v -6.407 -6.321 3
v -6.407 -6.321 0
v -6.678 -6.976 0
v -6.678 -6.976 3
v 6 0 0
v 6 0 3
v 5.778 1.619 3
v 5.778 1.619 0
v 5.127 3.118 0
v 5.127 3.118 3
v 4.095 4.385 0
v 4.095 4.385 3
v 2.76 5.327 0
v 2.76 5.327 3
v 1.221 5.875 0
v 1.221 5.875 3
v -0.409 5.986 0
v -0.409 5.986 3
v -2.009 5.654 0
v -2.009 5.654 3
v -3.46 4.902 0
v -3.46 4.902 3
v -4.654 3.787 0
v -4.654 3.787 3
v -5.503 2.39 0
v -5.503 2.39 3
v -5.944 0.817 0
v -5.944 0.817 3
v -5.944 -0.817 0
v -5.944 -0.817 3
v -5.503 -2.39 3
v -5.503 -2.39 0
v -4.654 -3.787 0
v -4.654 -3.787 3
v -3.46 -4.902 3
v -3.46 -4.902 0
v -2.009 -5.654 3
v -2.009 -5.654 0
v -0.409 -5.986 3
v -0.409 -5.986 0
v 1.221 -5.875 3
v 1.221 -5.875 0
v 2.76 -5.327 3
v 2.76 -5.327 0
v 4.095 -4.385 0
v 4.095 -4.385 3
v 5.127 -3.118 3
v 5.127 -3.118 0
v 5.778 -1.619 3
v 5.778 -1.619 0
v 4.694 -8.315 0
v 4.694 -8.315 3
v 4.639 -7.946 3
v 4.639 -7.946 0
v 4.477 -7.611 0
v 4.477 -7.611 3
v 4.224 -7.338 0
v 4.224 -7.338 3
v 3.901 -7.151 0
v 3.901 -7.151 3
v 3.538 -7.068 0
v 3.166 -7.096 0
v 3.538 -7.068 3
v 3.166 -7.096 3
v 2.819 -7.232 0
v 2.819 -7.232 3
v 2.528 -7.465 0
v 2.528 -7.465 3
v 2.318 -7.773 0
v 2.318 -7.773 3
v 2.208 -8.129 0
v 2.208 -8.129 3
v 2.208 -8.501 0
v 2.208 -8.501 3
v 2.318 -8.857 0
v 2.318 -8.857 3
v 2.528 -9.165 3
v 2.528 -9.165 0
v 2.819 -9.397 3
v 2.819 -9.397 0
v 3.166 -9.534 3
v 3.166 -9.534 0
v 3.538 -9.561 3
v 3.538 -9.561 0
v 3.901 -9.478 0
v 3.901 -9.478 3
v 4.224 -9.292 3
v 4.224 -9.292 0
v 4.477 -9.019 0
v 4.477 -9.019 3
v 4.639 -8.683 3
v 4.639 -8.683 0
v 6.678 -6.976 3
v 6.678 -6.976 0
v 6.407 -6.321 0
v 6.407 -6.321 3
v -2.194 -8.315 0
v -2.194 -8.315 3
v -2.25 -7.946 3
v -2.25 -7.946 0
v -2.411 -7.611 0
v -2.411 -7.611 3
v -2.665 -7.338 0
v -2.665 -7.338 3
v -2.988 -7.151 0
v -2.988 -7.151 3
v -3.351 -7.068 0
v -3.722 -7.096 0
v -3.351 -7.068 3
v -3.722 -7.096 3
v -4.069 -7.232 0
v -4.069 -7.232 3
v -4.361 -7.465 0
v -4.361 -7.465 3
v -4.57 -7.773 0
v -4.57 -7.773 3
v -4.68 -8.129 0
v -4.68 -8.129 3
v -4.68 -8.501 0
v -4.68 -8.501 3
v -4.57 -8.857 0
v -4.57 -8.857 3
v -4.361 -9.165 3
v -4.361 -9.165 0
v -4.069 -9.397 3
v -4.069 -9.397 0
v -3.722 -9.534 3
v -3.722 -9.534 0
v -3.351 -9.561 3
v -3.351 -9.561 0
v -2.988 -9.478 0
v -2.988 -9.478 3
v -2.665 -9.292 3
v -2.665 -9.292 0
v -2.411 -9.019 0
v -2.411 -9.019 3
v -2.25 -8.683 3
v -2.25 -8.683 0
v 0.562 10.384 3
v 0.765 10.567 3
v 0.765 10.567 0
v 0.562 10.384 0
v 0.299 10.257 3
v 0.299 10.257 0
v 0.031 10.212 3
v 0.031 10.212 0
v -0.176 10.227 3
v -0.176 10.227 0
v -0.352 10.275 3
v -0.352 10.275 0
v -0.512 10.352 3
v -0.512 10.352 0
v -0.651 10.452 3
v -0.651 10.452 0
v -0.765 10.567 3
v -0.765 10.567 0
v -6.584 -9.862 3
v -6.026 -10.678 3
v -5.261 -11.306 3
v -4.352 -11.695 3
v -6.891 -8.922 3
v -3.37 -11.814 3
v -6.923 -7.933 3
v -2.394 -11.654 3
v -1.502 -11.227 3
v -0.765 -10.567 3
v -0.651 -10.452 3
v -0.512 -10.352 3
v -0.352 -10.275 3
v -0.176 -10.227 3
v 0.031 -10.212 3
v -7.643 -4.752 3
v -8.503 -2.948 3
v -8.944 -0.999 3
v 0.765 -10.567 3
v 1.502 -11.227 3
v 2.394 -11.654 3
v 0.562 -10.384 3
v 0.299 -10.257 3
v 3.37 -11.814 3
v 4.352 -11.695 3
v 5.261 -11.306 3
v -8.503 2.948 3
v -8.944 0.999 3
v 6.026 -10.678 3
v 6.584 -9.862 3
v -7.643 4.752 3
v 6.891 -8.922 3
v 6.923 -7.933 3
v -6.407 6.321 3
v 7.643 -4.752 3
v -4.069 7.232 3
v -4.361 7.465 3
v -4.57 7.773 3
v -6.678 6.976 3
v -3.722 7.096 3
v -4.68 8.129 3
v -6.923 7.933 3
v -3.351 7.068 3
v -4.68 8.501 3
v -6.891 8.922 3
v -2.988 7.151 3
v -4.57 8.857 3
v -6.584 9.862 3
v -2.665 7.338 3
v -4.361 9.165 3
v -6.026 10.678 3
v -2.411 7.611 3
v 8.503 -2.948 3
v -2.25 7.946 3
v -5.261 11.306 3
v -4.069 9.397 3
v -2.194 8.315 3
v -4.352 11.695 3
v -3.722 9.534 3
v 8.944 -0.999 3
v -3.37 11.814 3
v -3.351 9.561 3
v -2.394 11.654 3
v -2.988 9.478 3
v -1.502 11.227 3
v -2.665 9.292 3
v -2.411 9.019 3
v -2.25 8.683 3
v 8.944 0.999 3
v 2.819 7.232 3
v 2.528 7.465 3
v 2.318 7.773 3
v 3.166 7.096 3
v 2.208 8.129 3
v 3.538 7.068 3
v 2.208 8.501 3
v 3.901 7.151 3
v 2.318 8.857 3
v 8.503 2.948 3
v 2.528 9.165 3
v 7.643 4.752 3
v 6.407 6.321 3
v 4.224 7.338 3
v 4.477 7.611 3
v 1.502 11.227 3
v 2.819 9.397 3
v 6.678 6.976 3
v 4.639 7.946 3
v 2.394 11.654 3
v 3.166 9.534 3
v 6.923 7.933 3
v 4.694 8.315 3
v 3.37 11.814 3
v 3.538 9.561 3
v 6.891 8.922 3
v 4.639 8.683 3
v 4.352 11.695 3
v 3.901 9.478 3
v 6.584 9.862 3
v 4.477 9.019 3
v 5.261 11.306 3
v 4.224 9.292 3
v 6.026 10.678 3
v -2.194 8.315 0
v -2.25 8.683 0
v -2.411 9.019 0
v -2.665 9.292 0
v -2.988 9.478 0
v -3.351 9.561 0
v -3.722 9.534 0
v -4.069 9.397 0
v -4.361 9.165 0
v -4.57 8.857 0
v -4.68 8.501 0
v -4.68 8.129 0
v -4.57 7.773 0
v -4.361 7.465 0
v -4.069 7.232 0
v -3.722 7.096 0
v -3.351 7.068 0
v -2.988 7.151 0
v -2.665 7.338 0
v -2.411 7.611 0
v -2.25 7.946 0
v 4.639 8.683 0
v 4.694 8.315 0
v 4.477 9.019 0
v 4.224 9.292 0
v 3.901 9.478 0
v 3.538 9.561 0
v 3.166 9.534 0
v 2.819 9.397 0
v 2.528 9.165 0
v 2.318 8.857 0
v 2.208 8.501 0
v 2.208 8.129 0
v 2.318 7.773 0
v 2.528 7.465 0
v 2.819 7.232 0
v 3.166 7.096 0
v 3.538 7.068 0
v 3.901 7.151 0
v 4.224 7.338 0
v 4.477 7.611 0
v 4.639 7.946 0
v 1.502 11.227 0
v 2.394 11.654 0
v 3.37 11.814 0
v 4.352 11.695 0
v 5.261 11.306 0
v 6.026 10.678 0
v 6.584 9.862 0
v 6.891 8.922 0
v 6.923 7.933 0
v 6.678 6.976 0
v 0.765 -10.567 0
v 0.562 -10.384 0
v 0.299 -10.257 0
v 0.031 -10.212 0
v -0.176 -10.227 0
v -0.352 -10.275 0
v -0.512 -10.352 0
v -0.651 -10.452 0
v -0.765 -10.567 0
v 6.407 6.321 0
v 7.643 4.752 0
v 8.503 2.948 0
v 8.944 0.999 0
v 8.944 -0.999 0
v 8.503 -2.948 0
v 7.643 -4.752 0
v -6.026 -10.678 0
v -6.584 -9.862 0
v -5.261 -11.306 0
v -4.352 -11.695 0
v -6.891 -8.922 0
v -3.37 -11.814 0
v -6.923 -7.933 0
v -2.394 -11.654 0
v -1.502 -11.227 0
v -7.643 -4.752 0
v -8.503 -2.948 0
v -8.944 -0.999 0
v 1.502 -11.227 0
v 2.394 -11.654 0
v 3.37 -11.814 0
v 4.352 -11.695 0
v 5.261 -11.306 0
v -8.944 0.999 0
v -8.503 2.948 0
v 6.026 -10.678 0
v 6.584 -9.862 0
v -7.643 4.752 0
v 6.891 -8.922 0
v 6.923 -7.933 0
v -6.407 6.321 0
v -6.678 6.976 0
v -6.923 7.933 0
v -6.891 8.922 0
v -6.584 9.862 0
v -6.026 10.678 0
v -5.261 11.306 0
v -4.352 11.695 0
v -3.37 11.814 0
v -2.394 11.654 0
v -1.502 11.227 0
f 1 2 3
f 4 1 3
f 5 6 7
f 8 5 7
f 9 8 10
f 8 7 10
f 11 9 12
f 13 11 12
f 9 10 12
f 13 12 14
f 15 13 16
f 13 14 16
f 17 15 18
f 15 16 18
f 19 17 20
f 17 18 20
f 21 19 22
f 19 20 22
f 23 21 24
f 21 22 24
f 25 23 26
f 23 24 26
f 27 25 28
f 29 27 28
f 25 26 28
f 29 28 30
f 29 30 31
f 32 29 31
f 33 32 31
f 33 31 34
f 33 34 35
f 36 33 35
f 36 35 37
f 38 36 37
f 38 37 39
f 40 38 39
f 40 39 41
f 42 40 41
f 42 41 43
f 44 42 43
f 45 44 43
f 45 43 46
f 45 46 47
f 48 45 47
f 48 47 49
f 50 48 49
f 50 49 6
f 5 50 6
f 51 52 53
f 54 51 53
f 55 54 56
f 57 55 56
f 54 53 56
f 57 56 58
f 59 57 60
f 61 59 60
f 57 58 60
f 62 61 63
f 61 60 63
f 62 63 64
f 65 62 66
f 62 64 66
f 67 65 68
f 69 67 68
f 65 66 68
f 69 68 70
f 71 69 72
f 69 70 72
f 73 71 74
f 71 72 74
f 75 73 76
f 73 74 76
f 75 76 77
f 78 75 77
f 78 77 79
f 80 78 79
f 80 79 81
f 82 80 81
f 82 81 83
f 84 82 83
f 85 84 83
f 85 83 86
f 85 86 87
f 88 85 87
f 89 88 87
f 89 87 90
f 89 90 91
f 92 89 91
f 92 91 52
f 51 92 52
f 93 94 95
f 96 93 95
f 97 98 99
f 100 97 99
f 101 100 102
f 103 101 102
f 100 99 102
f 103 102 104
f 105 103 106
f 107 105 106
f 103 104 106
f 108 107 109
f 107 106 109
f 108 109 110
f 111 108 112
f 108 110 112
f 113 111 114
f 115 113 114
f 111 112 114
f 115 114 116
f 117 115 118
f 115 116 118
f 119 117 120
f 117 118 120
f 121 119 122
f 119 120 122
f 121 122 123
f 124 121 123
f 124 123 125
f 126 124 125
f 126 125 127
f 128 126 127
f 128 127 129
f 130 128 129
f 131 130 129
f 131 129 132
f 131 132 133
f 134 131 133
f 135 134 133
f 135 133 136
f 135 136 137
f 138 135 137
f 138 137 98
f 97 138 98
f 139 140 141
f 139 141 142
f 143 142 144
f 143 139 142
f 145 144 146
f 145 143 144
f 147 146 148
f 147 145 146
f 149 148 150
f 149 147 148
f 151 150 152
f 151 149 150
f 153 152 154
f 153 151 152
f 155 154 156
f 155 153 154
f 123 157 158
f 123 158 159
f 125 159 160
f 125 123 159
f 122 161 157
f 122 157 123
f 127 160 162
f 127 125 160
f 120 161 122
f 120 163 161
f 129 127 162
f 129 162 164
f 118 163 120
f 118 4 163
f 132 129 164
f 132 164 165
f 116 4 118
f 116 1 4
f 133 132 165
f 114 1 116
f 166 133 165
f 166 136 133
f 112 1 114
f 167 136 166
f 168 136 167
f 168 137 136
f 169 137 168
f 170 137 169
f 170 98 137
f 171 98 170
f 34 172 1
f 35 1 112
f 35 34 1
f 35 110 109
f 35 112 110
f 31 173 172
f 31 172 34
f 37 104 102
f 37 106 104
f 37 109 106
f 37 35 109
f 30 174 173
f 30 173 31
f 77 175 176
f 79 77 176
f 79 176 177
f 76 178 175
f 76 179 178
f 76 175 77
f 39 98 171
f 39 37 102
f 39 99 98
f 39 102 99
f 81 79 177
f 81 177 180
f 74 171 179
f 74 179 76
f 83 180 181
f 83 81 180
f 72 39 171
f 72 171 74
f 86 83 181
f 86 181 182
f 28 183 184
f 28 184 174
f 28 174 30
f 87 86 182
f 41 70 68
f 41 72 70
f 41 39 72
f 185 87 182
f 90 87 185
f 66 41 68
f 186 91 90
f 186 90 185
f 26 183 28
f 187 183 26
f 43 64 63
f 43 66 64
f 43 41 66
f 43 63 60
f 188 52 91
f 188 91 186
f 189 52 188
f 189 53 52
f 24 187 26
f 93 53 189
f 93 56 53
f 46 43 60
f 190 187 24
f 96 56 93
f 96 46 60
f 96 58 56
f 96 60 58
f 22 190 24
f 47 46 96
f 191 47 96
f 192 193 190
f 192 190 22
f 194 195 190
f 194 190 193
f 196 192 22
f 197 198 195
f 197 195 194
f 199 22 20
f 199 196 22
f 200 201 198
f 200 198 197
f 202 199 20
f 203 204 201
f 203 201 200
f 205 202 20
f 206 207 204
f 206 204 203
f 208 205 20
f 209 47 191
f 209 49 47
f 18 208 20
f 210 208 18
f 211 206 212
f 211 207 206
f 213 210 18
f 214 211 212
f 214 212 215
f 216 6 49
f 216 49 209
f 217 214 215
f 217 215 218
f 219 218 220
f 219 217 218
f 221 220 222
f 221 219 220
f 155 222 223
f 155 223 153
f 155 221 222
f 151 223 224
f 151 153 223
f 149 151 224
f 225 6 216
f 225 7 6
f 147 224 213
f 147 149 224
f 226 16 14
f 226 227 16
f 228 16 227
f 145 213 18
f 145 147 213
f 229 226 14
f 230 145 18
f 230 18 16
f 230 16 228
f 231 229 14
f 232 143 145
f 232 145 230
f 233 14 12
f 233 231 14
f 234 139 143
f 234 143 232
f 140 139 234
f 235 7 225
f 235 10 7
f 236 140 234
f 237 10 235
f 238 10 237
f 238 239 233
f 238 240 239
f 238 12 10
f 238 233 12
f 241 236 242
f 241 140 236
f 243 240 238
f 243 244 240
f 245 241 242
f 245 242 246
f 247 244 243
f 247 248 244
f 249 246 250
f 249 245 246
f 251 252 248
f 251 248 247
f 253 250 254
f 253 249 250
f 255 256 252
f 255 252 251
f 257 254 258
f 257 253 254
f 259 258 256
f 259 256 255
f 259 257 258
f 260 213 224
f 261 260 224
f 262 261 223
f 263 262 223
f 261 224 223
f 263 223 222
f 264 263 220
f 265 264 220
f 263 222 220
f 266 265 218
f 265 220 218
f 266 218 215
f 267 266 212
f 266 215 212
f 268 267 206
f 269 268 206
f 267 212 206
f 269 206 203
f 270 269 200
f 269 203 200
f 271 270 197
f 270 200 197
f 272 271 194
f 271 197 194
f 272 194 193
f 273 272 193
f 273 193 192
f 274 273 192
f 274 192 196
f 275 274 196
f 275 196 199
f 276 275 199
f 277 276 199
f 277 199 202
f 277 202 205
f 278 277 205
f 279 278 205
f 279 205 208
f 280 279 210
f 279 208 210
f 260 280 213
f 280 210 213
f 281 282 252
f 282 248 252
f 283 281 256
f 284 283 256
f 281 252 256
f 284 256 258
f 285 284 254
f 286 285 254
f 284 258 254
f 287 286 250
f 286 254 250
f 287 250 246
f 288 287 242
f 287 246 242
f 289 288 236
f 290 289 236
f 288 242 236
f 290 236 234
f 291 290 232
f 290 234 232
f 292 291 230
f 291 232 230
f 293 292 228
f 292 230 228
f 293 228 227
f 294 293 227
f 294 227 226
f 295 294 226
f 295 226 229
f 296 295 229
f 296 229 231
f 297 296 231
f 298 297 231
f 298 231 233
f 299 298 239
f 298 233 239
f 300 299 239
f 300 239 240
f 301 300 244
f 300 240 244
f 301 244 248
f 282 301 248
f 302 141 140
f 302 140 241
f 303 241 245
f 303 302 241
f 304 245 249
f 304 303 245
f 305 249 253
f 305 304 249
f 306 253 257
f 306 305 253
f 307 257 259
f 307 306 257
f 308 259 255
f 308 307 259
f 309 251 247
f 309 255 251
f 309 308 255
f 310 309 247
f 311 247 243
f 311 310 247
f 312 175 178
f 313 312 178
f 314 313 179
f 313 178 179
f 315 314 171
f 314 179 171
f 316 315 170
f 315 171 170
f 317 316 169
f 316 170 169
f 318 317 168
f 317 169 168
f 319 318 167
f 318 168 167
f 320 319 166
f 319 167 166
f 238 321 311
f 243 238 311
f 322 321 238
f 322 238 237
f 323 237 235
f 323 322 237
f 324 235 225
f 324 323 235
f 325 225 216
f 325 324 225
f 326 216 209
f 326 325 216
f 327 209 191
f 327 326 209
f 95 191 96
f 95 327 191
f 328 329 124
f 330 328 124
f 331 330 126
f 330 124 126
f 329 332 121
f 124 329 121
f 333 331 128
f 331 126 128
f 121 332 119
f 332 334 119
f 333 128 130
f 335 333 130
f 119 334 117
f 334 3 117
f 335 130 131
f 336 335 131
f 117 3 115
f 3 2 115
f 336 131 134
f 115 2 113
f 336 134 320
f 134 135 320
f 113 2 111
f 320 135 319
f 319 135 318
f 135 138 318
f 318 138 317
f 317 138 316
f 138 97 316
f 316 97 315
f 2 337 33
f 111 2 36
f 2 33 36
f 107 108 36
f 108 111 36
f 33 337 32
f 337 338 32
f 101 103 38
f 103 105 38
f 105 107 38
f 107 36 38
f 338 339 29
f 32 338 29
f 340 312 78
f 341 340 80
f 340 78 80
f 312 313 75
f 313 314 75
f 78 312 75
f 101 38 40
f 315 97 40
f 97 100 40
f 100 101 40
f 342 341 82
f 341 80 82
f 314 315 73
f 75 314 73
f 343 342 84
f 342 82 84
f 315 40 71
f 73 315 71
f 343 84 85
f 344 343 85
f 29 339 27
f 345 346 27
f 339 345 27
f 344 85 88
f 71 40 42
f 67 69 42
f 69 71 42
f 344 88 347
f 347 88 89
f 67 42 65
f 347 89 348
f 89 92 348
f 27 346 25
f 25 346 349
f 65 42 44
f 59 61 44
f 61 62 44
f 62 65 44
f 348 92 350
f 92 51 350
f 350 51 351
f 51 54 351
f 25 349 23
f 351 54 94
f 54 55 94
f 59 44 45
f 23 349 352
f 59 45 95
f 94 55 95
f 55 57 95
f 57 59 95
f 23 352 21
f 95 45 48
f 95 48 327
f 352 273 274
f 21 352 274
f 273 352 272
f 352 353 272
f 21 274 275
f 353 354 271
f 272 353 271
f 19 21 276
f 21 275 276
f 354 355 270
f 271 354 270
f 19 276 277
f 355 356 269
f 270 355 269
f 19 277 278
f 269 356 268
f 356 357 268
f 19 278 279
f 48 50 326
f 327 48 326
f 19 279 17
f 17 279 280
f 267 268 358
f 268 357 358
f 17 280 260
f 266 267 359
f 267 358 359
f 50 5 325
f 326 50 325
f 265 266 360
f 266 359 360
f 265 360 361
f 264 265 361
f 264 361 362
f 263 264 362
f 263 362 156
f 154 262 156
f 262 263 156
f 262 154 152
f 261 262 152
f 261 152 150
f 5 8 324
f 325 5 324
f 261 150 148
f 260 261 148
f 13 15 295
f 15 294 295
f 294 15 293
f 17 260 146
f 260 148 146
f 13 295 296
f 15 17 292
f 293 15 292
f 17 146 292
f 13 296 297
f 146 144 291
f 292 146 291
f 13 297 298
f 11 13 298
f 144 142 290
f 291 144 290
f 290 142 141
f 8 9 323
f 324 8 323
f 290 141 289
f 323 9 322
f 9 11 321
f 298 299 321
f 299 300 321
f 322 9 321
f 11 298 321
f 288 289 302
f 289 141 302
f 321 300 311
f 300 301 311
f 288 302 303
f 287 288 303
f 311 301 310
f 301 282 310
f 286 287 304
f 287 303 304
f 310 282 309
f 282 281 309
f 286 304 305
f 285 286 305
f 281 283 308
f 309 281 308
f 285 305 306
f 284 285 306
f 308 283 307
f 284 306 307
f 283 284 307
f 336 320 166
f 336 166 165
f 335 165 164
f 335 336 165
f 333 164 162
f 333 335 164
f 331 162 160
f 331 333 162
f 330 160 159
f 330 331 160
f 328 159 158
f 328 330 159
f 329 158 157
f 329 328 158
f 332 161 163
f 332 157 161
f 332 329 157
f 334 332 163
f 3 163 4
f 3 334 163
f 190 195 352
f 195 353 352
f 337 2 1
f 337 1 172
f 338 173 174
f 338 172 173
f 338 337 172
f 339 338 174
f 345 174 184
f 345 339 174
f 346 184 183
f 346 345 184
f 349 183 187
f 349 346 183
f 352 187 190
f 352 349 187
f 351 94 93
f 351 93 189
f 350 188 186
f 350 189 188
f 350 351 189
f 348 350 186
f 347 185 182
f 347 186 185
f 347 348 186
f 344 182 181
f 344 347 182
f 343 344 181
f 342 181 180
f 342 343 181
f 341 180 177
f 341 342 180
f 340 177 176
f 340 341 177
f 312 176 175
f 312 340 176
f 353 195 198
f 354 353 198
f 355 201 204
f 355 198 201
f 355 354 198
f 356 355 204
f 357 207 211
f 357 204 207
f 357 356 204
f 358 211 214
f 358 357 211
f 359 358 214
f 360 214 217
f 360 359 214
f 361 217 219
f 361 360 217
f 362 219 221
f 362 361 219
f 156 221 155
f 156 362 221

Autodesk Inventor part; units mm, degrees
ref_plane "YZ Plane" through (0, 0, 0) normal (1, 0, 0) x (0, 1, 0)
ref_plane "XZ Plane" through (0, 0, 0) normal (0, 1, 0) x (-1, 0, 0)
ref_plane "XY Plane" through (0, 0, 0) normal (0, 0, 1) x (1, 0, 0)
sketch "Sketch1" plane through (0, 0, 0) normal (0, 0, 1) x (1, 0, 0)
  circle A0 centre (0, 0) radius 9
  line L0 (-3.4442, -8.3149) -> (3.4442, 8.3149) construction
  line L1 (-0.2106, -9.6543) -> (6.6777, 6.9755)
  line L2 (0.2106, 9.6543) -> (-6.6777, -6.9755)
  arc A1 (-6.6777, -6.9755) -> (-0.2106, -9.6543) centre (-3.4442, -8.3149) ccw
  arc A2 (6.6777, 6.9755) -> (0.2106, 9.6543) centre (3.4442, 8.3149) ccw
  line L3 (3.4442, -8.3149) -> (-3.4442, 8.3149) construction
  line L4 (6.6777, -6.9755) -> (-0.2106, 9.6543)
  line L5 (-6.6777, 6.9755) -> (0.2106, -9.6543)
  arc A3 (0.2106, -9.6543) -> (6.6777, -6.9755) centre (3.4442, -8.3149) ccw
  arc A4 (-0.2106, 9.6543) -> (-6.6777, 6.9755) centre (-3.4442, 8.3149) ccw
  line L6 (0, 0) -> (0, 9) construction
  dimension "d3" = 18
  dimension "d0" = 45
  dimension "d1" = 18
  dimension "d2" = 3.5
extrude "Extrusion1" add sketch "Sketch1" along normal blind 3
sketch "Sketch2" plane through (0, 0, 3) normal (0, 0, 1) x (1, 0, 0)
  arc A0 (-0.2106, 9.6543) -> (-6.6777, 6.9755) centre (-3.4442, 8.3149) ccw projected
  arc A1 (-6.6777, -6.9755) -> (-0.2106, -9.6543) centre (-3.4442, -8.3149) ccw projected
  arc A2 (0.2106, -9.6543) -> (6.6777, -6.9755) centre (3.4442, -8.3149) ccw projected
  arc A3 (6.4066, -6.321) -> (6.4066, 6.321) centre (0, 0) ccw projected
  arc A4 (6.6777, 6.9755) -> (0.2106, 9.6543) centre (3.4442, 8.3149) ccw projected
  circle A5 centre (-3.4442, 8.3149) radius 1.25
  circle A6 centre (3.4442, 8.3149) radius 1.25
  circle A7 centre (3.4442, -8.3149) radius 1.25
  circle A8 centre (-3.4442, -8.3149) radius 1.25
  circle A9 centre (0, 0) radius 6
  point P0 (0, 10.3491)
  point P1 (0, -10.3491)
  dimension "d6" = 2.5
  dimension "d7" = 12
extrude "Extrusion2" cut sketch "Sketch2" against normal through all
fillet "Fillet2" radius 1 2 edges at (0, -9.1459, 1.5) (0, 9.1459, 1.5)
sketch "Sketch3" plane through (0, 0, 3) normal (0, 0, 1) x (1, 0, 0)
  circle A0 centre (-3.4442, -8.3149) radius 1.25 projected
  circle A1 centre (3.4442, 8.3149) radius 1.25 projected
  circle A2 centre (-3.4442, 8.3149) radius 1.25 projected
  circle A3 centre (3.4442, -8.3149) radius 1.25 projected
  circle A4 centre (0, 0) radius 6 projected
  arc A5 (-6.4066, 6.321) -> (-6.4066, -6.321) centre (0, 0) ccw projected
  line L0 (-6.4066, -6.321) -> (-6.6777, -6.9755) projected
  arc A6 (-6.6777, -6.9755) -> (-0.7654, -10.5675) centre (-3.4442, -8.3149) ccw projected
  arc A7 (0.7654, -10.5675) -> (-0.7654, -10.5675) centre (0, -11.2111) ccw projected
  arc A8 (0.7654, -10.5675) -> (6.6777, -6.9755) centre (3.4442, -8.3149) ccw projected
  line L1 (6.6777, -6.9755) -> (6.4066, -6.321) projected
  arc A9 (6.4066, -6.321) -> (6.4066, 6.321) centre (0, 0) ccw projected
  line L2 (6.4066, 6.321) -> (6.6777, 6.9755) projected
  arc A10 (6.6777, 6.9755) -> (0.7654, 10.5675) centre (3.4442, 8.3149) ccw projected
  arc A11 (-0.7654, 10.5675) -> (0.7654, 10.5675) centre (0, 11.2111) ccw projected
  arc A12 (-0.7654, 10.5675) -> (-6.6777, 6.9755) centre (-3.4442, 8.3149) ccw projected
  line L3 (-6.6777, 6.9755) -> (-6.4066, 6.321) projected
  circle A13 centre (-3.4442, -8.3149) radius 3 construction
  dimension "d12" = 6
properties part number "encoder_bearing_holder18_6mm_45"
